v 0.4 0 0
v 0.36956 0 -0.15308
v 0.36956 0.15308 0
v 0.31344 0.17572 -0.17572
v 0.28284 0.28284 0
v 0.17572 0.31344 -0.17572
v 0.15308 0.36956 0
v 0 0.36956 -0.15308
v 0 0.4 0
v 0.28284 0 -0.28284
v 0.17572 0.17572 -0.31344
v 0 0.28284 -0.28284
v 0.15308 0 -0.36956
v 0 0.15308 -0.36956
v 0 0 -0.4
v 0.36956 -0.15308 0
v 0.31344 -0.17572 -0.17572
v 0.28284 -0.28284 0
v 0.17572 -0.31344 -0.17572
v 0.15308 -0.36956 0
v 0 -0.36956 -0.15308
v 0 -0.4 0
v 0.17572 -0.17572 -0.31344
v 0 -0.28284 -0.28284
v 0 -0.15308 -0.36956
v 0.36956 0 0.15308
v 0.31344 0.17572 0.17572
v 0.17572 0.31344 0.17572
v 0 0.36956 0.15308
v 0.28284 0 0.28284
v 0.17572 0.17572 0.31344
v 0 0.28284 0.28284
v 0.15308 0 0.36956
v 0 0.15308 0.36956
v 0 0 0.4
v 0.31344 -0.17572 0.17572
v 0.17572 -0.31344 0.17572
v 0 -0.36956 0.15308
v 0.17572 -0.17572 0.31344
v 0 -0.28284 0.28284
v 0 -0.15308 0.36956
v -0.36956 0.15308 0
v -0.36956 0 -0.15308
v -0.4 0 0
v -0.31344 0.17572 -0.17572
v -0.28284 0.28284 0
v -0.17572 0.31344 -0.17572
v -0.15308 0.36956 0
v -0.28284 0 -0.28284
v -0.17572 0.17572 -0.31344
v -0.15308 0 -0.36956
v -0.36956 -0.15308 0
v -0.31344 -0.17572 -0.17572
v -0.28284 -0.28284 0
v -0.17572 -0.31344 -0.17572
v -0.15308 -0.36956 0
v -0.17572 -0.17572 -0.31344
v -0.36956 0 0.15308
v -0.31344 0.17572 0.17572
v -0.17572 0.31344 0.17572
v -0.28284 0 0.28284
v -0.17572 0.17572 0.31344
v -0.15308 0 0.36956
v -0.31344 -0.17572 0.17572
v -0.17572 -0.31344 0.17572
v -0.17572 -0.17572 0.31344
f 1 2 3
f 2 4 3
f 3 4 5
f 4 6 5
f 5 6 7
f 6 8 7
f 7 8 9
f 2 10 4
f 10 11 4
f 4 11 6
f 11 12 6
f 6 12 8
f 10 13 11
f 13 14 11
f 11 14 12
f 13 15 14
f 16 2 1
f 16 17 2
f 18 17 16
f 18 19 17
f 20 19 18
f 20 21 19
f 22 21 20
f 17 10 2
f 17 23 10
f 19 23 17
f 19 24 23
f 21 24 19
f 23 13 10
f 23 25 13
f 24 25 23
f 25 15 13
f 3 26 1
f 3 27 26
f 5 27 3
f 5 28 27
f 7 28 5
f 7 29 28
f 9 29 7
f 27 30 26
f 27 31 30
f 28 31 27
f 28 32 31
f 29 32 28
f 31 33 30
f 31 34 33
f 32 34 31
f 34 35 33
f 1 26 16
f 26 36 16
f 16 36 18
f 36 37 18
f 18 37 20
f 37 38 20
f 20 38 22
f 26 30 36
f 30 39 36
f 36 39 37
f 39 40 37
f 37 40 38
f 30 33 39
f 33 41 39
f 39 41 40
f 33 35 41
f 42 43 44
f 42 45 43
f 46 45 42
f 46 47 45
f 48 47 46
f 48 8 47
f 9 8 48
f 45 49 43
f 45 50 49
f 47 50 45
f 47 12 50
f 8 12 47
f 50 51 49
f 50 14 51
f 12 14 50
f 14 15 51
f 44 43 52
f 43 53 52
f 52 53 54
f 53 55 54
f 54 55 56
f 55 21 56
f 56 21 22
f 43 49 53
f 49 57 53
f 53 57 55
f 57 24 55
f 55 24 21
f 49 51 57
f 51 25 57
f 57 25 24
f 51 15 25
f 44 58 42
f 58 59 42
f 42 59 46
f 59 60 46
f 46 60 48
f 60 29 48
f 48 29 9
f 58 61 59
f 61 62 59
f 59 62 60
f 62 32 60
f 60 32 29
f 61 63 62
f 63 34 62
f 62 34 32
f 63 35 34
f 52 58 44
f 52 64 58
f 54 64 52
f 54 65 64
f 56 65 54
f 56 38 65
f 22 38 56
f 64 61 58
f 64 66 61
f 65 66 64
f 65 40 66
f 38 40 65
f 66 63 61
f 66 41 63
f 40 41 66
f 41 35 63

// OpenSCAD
// file: 1-8sphe.scad
use <../lib.scad>
function ldraw_lib__1_8sphe() = [
// 0 Sphere 0.125
// 0 Name: 1-8sphe.dat
// 0 Author: James Jessiman
// 0 !LDRAW_ORG Primitive UPDATE 2012-03
// 0 !LICENSE Licensed under CC BY 4.0 : see CAreadme.txt
// 
// 0 BFC CERTIFY CCW
  [0,"BFC","CERTIFY"],
  [0,"BFC","CCW"],
// 
// 0 !HISTORY 2000-08-01 {Axel Poque} fixes to resolve L3P error messages.
// 0 !HISTORY 2000-08-01 {Manfred Moolhuysen} fixes to resolve L3P error messages.
// 0 !HISTORY 2000-09-30 [PTadmin] Official Update 2000-02
// 0 !HISTORY 2002-03-28 [hafhead] Made BFC compliant
// 0 !HISTORY 2002-04-25 [PTadmin] Official Update 2002-02
// 0 !HISTORY 2007-06-22 [PTadmin] Header formatted for Contributor Agreement
// 0 !HISTORY 2008-07-01 [PTadmin] Official Update 2008-01
// 0 !HISTORY 2010-09-12 [MagFors] Changed winding, removed duplicated cond-line, optimized filesize
// 0 !HISTORY 2010-12-31 [PTadmin] Official Update 2010-03
// 0 !HISTORY 2012-07-01 [tcobbs] Replaced with geometry from LDView
// 0 !HISTORY 2012-12-28 [PTadmin] Official Update 2012-03
// 
// 
// 3 16 1 0 0 0.9239 0.3827 0 0.9239 0 0.3827
  [3,16,1,0,0,0.9239,0.3827,0,0.9239,0,0.3827],
// 3 16 0.9239 0.3827 0 0.7836 0.4393 0.4393 0.9239 0 0.3827
  [3,16,0.9239,0.3827,0,0.7836,0.4393,0.4393,0.9239,0,0.3827],
// 3 16 0.9239 0 0.3827 0.7836 0.4393 0.4393 0.7071 0 0.7071
  [3,16,0.9239,0,0.3827,0.7836,0.4393,0.4393,0.7071,0,0.7071],
// 3 16 0.7836 0.4393 0.4393 0.4393 0.4393 0.7836 0.7071 0 0.7071
  [3,16,0.7836,0.4393,0.4393,0.4393,0.4393,0.7836,0.7071,0,0.7071],
// 3 16 0.7071 0 0.7071 0.4393 0.4393 0.7836 0.3827 0 0.9239
  [3,16,0.7071,0,0.7071,0.4393,0.4393,0.7836,0.3827,0,0.9239],
// 3 16 0.4393 0.4393 0.7836 0 0.3827 0.9239 0.3827 0 0.9239
  [3,16,0.4393,0.4393,0.7836,0,0.3827,0.9239,0.3827,0,0.9239],
// 3 16 0.3827 0 0.9239 0 0.3827 0.9239 0 0 1
  [3,16,0.3827,0,0.9239,0,0.3827,0.9239,0,0,1],
// 3 16 0.9239 0.3827 0 0.7071 0.7071 0 0.7836 0.4393 0.4393
  [3,16,0.9239,0.3827,0,0.7071,0.7071,0,0.7836,0.4393,0.4393],
// 3 16 0.7071 0.7071 0 0.4393 0.7836 0.4393 0.7836 0.4393 0.4393
  [3,16,0.7071,0.7071,0,0.4393,0.7836,0.4393,0.7836,0.4393,0.4393],
// 3 16 0.7836 0.4393 0.4393 0.4393 0.7836 0.4393 0.4393 0.4393 0.7836
  [3,16,0.7836,0.4393,0.4393,0.4393,0.7836,0.4393,0.4393,0.4393,0.7836],
// 3 16 0.4393 0.7836 0.4393 0 0.7071 0.7071 0.4393 0.4393 0.7836
  [3,16,0.4393,0.7836,0.4393,0,0.7071,0.7071,0.4393,0.4393,0.7836],
// 3 16 0.4393 0.4393 0.7836 0 0.7071 0.7071 0 0.3827 0.9239
  [3,16,0.4393,0.4393,0.7836,0,0.7071,0.7071,0,0.3827,0.9239],
// 3 16 0.7071 0.7071 0 0.3827 0.9239 0 0.4393 0.7836 0.4393
  [3,16,0.7071,0.7071,0,0.3827,0.9239,0,0.4393,0.7836,0.4393],
// 3 16 0.3827 0.9239 0 0 0.9239 0.3827 0.4393 0.7836 0.4393
  [3,16,0.3827,0.9239,0,0,0.9239,0.3827,0.4393,0.7836,0.4393],
// 3 16 0.4393 0.7836 0.4393 0 0.9239 0.3827 0 0.7071 0.7071
  [3,16,0.4393,0.7836,0.4393,0,0.9239,0.3827,0,0.7071,0.7071],
// 3 16 0.3827 0.9239 0 0 1 0 0 0.9239 0.3827
  [3,16,0.3827,0.9239,0,0,1,0,0,0.9239,0.3827],
// 
// 5 24 1 0 0 0.9239 0.3827 0 1 0 -0.1 0.9239 0 0.3827
  [5,24,1,0,0,0.9239,0.3827,0,1,0,-0.1,0.9239,0,0.3827],
// 5 24 0.9239 0.3827 0 0.9239 0 0.3827 1 0 0 0.7836 0.4393 0.4393
  [5,24,0.9239,0.3827,0,0.9239,0,0.3827,1,0,0,0.7836,0.4393,0.4393],
// 5 24 1 0 0 0.9239 0 0.3827 0.9239 0.3827 0 1 -0.1 0
  [5,24,1,0,0,0.9239,0,0.3827,0.9239,0.3827,0,1,-0.1,0],
// 5 24 0.9239 0 0.3827 0.7836 0.4393 0.4393 0.9239 0.3827 0 0.7071 0 0.7071
  [5,24,0.9239,0,0.3827,0.7836,0.4393,0.4393,0.9239,0.3827,0,0.7071,0,0.7071],
// 5 24 0.7836 0.4393 0.4393 0.7071 0 0.7071 0.9239 0 0.3827 0.4393 0.4393 0.7836
  [5,24,0.7836,0.4393,0.4393,0.7071,0,0.7071,0.9239,0,0.3827,0.4393,0.4393,0.7836],
// 5 24 0.9239 0 0.3827 0.7071 0 0.7071 0.7836 0.4393 0.4393 0.9239 -0.1 0.3827
  [5,24,0.9239,0,0.3827,0.7071,0,0.7071,0.7836,0.4393,0.4393,0.9239,-0.1,0.3827],
// 5 24 0.7071 0 0.7071 0.4393 0.4393 0.7836 0.7836 0.4393 0.4393 0.3827 0 0.9239
  [5,24,0.7071,0,0.7071,0.4393,0.4393,0.7836,0.7836,0.4393,0.4393,0.3827,0,0.9239],
// 5 24 0.4393 0.4393 0.7836 0.3827 0 0.9239 0.7071 0 0.7071 0 0.3827 0.9239
  [5,24,0.4393,0.4393,0.7836,0.3827,0,0.9239,0.7071,0,0.7071,0,0.3827,0.9239],
// 5 24 0.7071 0 0.7071 0.3827 0 0.9239 0.4393 0.4393 0.7836 0.7071 -0.1 0.7071
  [5,24,0.7071,0,0.7071,0.3827,0,0.9239,0.4393,0.4393,0.7836,0.7071,-0.1,0.7071],
// 5 24 0.3827 0 0.9239 0 0.3827 0.9239 0.4393 0.4393 0.7836 0 0 1
  [5,24,0.3827,0,0.9239,0,0.3827,0.9239,0.4393,0.4393,0.7836,0,0,1],
// 5 24 0 0.3827 0.9239 0 0 1 0.3827 0 0.9239 -0.1 0.3827 0.9239
  [5,24,0,0.3827,0.9239,0,0,1,0.3827,0,0.9239,-0.1,0.3827,0.9239],
// 5 24 0.3827 0 0.9239 0 0 1 0 0.3827 0.9239 0.3827 -0.1 0.9239
  [5,24,0.3827,0,0.9239,0,0,1,0,0.3827,0.9239,0.3827,-0.1,0.9239],
// 5 24 0.9239 0.3827 0 0.7071 0.7071 0 0.9239 0.3827 -0.1 0.7836 0.4393 0.4393
  [5,24,0.9239,0.3827,0,0.7071,0.7071,0,0.9239,0.3827,-0.1,0.7836,0.4393,0.4393],
// 5 24 0.7071 0.7071 0 0.7836 0.4393 0.4393 0.9239 0.3827 0 0.4393 0.7836 0.4393
  [5,24,0.7071,0.7071,0,0.7836,0.4393,0.4393,0.9239,0.3827,0,0.4393,0.7836,0.4393],
// 5 24 0.9239 0.3827 0 0.7836 0.4393 0.4393 0.7071 0.7071 0 0.9239 0 0.3827
  [5,24,0.9239,0.3827,0,0.7836,0.4393,0.4393,0.7071,0.7071,0,0.9239,0,0.3827],
// 5 24 0.7836 0.4393 0.4393 0.4393 0.7836 0.4393 0.7071 0.7071 0 0.4393 0.4393 0.7836
  [5,24,0.7836,0.4393,0.4393,0.4393,0.7836,0.4393,0.7071,0.7071,0,0.4393,0.4393,0.7836],
// 5 24 0.4393 0.7836 0.4393 0.4393 0.4393 0.7836 0.7836 0.4393 0.4393 0 0.7071 0.7071
  [5,24,0.4393,0.7836,0.4393,0.4393,0.4393,0.7836,0.7836,0.4393,0.4393,0,0.7071,0.7071],
// 5 24 0.7836 0.4393 0.4393 0.4393 0.4393 0.7836 0.4393 0.7836 0.4393 0.7071 0 0.7071
  [5,24,0.7836,0.4393,0.4393,0.4393,0.4393,0.7836,0.4393,0.7836,0.4393,0.7071,0,0.7071],
// 5 24 0.4393 0.4393 0.7836 0 0.7071 0.7071 0.4393 0.7836 0.4393 0 0.3827 0.9239
  [5,24,0.4393,0.4393,0.7836,0,0.7071,0.7071,0.4393,0.7836,0.4393,0,0.3827,0.9239],
// 5 24 0 0.7071 0.7071 0 0.3827 0.9239 0.4393 0.4393 0.7836 -0.1 0.7071 0.7071
  [5,24,0,0.7071,0.7071,0,0.3827,0.9239,0.4393,0.4393,0.7836,-0.1,0.7071,0.7071],
// 5 24 0.4393 0.4393 0.7836 0 0.3827 0.9239 0 0.7071 0.7071 0.3827 0 0.9239
  [5,24,0.4393,0.4393,0.7836,0,0.3827,0.9239,0,0.7071,0.7071,0.3827,0,0.9239],
// 5 24 0.7071 0.7071 0 0.3827 0.9239 0 0.7071 0.7071 -0.1 0.4393 0.7836 0.4393
  [5,24,0.7071,0.7071,0,0.3827,0.9239,0,0.7071,0.7071,-0.1,0.4393,0.7836,0.4393],
// 5 24 0.3827 0.9239 0 0.4393 0.7836 0.4393 0.7071 0.7071 0 0 0.9239 0.3827
  [5,24,0.3827,0.9239,0,0.4393,0.7836,0.4393,0.7071,0.7071,0,0,0.9239,0.3827],
// 5 24 0.7071 0.7071 0 0.4393 0.7836 0.4393 0.3827 0.9239 0 0.7836 0.4393 0.4393
  [5,24,0.7071,0.7071,0,0.4393,0.7836,0.4393,0.3827,0.9239,0,0.7836,0.4393,0.4393],
// 5 24 0.4393 0.7836 0.4393 0 0.9239 0.3827 0.3827 0.9239 0 0 0.7071 0.7071
  [5,24,0.4393,0.7836,0.4393,0,0.9239,0.3827,0.3827,0.9239,0,0,0.7071,0.7071],
// 5 24 0 0.9239 0.3827 0 0.7071 0.7071 0.4393 0.7836 0.4393 -0.1 0.9239 0.3827
  [5,24,0,0.9239,0.3827,0,0.7071,0.7071,0.4393,0.7836,0.4393,-0.1,0.9239,0.3827],
// 5 24 0.4393 0.7836 0.4393 0 0.7071 0.7071 0 0.9239 0.3827 0.4393 0.4393 0.7836
  [5,24,0.4393,0.7836,0.4393,0,0.7071,0.7071,0,0.9239,0.3827,0.4393,0.4393,0.7836],
// 5 24 0.3827 0.9239 0 0 1 0 0.3827 0.9239 -0.1 0 0.9239 0.3827
  [5,24,0.3827,0.9239,0,0,1,0,0.3827,0.9239,-0.1,0,0.9239,0.3827],
// 5 24 0 1 0 0 0.9239 0.3827 0.3827 0.9239 0 -0.1 1 0
  [5,24,0,1,0,0,0.9239,0.3827,0.3827,0.9239,0,-0.1,1,0],
// 5 24 0.3827 0.9239 0 0 0.9239 0.3827 0 1 0 0.4393 0.7836 0.4393
  [5,24,0.3827,0.9239,0,0,0.9239,0.3827,0,1,0,0.4393,0.7836,0.4393],
];
module ldraw_lib__1_8sphe(step=0, col=false, unit=2/5, alt=false, line=0.2, solid=!$preview)
    makepoly(ldraw_lib__1_8sphe(), step=step, col=col, unit=unit, alt=alt, line=line, solid=solid);
ldraw_lib__1_8sphe(line=0.2);
// main file
use <../lib.scad>
use <1-8sphe.scad>
function ldraw_lib__8_8sphe() = [
// 0 Sphere 1.0
// 0 Name: 8-8sphe.dat
// 0 Author: James Jessiman
// 0 !LDRAW_ORG Primitive UPDATE 2012-01
// 0 !LICENSE Licensed under CC BY 4.0 : see CAreadme.txt
// 
// 0 BFC CERTIFY CCW
  [0,"BFC","CERTIFY"],
  [0,"BFC","CCW"],
// 
// 0 !HISTORY 2002-09-01 [BrickCaster] Added BFC statement
// 0 !HISTORY 2002-11-30 [PTadmin] Official Update 2002-05
// 0 !HISTORY 2007-06-24 [PTadmin] Header formatted for Contributor Agreement
// 0 !HISTORY 2008-07-01 [PTadmin] Official Update 2008-01
// 0 !HISTORY 2012-02-16 [Philo] Changed to CCW
// 0 !HISTORY 2012-03-30 [PTadmin] Official Update 2012-01
// 
// 
// 1 16 0 0 0 1 0 0 0 1 0 0 0 1 1-8sphe.dat
  [1,16,0,0,0,1,0,0,0,1,0,0,0,1, ldraw_lib__1_8sphe()],
// 1 16 0 0 0 1 0 0 0 1 0 0 0 -1 1-8sphe.dat
  [1,16,0,0,0,1,0,0,0,1,0,0,0,-1, ldraw_lib__1_8sphe()],
// 1 16 0 0 0 1 0 0 0 -1 0 0 0 1 1-8sphe.dat
  [1,16,0,0,0,1,0,0,0,-1,0,0,0,1, ldraw_lib__1_8sphe()],
// 1 16 0 0 0 1 0 0 0 -1 0 0 0 -1 1-8sphe.dat
  [1,16,0,0,0,1,0,0,0,-1,0,0,0,-1, ldraw_lib__1_8sphe()],
// 1 16 0 0 0 -1 0 0 0 1 0 0 0 1 1-8sphe.dat
  [1,16,0,0,0,-1,0,0,0,1,0,0,0,1, ldraw_lib__1_8sphe()],
// 1 16 0 0 0 -1 0 0 0 1 0 0 0 -1 1-8sphe.dat
  [1,16,0,0,0,-1,0,0,0,1,0,0,0,-1, ldraw_lib__1_8sphe()],
// 1 16 0 0 0 -1 0 0 0 -1 0 0 0 1 1-8sphe.dat
  [1,16,0,0,0,-1,0,0,0,-1,0,0,0,1, ldraw_lib__1_8sphe()],
// 1 16 0 0 0 -1 0 0 0 -1 0 0 0 -1 1-8sphe.dat
  [1,16,0,0,0,-1,0,0,0,-1,0,0,0,-1, ldraw_lib__1_8sphe()],
];
module ldraw_lib__8_8sphe(step=0, col=false, unit=2/5, alt=false, line=0.2, solid=!$preview)
    makepoly(ldraw_lib__8_8sphe(), step=step, col=col, unit=unit, alt=alt, line=line, solid=solid);
ldraw_lib__8_8sphe(line=0.2);
